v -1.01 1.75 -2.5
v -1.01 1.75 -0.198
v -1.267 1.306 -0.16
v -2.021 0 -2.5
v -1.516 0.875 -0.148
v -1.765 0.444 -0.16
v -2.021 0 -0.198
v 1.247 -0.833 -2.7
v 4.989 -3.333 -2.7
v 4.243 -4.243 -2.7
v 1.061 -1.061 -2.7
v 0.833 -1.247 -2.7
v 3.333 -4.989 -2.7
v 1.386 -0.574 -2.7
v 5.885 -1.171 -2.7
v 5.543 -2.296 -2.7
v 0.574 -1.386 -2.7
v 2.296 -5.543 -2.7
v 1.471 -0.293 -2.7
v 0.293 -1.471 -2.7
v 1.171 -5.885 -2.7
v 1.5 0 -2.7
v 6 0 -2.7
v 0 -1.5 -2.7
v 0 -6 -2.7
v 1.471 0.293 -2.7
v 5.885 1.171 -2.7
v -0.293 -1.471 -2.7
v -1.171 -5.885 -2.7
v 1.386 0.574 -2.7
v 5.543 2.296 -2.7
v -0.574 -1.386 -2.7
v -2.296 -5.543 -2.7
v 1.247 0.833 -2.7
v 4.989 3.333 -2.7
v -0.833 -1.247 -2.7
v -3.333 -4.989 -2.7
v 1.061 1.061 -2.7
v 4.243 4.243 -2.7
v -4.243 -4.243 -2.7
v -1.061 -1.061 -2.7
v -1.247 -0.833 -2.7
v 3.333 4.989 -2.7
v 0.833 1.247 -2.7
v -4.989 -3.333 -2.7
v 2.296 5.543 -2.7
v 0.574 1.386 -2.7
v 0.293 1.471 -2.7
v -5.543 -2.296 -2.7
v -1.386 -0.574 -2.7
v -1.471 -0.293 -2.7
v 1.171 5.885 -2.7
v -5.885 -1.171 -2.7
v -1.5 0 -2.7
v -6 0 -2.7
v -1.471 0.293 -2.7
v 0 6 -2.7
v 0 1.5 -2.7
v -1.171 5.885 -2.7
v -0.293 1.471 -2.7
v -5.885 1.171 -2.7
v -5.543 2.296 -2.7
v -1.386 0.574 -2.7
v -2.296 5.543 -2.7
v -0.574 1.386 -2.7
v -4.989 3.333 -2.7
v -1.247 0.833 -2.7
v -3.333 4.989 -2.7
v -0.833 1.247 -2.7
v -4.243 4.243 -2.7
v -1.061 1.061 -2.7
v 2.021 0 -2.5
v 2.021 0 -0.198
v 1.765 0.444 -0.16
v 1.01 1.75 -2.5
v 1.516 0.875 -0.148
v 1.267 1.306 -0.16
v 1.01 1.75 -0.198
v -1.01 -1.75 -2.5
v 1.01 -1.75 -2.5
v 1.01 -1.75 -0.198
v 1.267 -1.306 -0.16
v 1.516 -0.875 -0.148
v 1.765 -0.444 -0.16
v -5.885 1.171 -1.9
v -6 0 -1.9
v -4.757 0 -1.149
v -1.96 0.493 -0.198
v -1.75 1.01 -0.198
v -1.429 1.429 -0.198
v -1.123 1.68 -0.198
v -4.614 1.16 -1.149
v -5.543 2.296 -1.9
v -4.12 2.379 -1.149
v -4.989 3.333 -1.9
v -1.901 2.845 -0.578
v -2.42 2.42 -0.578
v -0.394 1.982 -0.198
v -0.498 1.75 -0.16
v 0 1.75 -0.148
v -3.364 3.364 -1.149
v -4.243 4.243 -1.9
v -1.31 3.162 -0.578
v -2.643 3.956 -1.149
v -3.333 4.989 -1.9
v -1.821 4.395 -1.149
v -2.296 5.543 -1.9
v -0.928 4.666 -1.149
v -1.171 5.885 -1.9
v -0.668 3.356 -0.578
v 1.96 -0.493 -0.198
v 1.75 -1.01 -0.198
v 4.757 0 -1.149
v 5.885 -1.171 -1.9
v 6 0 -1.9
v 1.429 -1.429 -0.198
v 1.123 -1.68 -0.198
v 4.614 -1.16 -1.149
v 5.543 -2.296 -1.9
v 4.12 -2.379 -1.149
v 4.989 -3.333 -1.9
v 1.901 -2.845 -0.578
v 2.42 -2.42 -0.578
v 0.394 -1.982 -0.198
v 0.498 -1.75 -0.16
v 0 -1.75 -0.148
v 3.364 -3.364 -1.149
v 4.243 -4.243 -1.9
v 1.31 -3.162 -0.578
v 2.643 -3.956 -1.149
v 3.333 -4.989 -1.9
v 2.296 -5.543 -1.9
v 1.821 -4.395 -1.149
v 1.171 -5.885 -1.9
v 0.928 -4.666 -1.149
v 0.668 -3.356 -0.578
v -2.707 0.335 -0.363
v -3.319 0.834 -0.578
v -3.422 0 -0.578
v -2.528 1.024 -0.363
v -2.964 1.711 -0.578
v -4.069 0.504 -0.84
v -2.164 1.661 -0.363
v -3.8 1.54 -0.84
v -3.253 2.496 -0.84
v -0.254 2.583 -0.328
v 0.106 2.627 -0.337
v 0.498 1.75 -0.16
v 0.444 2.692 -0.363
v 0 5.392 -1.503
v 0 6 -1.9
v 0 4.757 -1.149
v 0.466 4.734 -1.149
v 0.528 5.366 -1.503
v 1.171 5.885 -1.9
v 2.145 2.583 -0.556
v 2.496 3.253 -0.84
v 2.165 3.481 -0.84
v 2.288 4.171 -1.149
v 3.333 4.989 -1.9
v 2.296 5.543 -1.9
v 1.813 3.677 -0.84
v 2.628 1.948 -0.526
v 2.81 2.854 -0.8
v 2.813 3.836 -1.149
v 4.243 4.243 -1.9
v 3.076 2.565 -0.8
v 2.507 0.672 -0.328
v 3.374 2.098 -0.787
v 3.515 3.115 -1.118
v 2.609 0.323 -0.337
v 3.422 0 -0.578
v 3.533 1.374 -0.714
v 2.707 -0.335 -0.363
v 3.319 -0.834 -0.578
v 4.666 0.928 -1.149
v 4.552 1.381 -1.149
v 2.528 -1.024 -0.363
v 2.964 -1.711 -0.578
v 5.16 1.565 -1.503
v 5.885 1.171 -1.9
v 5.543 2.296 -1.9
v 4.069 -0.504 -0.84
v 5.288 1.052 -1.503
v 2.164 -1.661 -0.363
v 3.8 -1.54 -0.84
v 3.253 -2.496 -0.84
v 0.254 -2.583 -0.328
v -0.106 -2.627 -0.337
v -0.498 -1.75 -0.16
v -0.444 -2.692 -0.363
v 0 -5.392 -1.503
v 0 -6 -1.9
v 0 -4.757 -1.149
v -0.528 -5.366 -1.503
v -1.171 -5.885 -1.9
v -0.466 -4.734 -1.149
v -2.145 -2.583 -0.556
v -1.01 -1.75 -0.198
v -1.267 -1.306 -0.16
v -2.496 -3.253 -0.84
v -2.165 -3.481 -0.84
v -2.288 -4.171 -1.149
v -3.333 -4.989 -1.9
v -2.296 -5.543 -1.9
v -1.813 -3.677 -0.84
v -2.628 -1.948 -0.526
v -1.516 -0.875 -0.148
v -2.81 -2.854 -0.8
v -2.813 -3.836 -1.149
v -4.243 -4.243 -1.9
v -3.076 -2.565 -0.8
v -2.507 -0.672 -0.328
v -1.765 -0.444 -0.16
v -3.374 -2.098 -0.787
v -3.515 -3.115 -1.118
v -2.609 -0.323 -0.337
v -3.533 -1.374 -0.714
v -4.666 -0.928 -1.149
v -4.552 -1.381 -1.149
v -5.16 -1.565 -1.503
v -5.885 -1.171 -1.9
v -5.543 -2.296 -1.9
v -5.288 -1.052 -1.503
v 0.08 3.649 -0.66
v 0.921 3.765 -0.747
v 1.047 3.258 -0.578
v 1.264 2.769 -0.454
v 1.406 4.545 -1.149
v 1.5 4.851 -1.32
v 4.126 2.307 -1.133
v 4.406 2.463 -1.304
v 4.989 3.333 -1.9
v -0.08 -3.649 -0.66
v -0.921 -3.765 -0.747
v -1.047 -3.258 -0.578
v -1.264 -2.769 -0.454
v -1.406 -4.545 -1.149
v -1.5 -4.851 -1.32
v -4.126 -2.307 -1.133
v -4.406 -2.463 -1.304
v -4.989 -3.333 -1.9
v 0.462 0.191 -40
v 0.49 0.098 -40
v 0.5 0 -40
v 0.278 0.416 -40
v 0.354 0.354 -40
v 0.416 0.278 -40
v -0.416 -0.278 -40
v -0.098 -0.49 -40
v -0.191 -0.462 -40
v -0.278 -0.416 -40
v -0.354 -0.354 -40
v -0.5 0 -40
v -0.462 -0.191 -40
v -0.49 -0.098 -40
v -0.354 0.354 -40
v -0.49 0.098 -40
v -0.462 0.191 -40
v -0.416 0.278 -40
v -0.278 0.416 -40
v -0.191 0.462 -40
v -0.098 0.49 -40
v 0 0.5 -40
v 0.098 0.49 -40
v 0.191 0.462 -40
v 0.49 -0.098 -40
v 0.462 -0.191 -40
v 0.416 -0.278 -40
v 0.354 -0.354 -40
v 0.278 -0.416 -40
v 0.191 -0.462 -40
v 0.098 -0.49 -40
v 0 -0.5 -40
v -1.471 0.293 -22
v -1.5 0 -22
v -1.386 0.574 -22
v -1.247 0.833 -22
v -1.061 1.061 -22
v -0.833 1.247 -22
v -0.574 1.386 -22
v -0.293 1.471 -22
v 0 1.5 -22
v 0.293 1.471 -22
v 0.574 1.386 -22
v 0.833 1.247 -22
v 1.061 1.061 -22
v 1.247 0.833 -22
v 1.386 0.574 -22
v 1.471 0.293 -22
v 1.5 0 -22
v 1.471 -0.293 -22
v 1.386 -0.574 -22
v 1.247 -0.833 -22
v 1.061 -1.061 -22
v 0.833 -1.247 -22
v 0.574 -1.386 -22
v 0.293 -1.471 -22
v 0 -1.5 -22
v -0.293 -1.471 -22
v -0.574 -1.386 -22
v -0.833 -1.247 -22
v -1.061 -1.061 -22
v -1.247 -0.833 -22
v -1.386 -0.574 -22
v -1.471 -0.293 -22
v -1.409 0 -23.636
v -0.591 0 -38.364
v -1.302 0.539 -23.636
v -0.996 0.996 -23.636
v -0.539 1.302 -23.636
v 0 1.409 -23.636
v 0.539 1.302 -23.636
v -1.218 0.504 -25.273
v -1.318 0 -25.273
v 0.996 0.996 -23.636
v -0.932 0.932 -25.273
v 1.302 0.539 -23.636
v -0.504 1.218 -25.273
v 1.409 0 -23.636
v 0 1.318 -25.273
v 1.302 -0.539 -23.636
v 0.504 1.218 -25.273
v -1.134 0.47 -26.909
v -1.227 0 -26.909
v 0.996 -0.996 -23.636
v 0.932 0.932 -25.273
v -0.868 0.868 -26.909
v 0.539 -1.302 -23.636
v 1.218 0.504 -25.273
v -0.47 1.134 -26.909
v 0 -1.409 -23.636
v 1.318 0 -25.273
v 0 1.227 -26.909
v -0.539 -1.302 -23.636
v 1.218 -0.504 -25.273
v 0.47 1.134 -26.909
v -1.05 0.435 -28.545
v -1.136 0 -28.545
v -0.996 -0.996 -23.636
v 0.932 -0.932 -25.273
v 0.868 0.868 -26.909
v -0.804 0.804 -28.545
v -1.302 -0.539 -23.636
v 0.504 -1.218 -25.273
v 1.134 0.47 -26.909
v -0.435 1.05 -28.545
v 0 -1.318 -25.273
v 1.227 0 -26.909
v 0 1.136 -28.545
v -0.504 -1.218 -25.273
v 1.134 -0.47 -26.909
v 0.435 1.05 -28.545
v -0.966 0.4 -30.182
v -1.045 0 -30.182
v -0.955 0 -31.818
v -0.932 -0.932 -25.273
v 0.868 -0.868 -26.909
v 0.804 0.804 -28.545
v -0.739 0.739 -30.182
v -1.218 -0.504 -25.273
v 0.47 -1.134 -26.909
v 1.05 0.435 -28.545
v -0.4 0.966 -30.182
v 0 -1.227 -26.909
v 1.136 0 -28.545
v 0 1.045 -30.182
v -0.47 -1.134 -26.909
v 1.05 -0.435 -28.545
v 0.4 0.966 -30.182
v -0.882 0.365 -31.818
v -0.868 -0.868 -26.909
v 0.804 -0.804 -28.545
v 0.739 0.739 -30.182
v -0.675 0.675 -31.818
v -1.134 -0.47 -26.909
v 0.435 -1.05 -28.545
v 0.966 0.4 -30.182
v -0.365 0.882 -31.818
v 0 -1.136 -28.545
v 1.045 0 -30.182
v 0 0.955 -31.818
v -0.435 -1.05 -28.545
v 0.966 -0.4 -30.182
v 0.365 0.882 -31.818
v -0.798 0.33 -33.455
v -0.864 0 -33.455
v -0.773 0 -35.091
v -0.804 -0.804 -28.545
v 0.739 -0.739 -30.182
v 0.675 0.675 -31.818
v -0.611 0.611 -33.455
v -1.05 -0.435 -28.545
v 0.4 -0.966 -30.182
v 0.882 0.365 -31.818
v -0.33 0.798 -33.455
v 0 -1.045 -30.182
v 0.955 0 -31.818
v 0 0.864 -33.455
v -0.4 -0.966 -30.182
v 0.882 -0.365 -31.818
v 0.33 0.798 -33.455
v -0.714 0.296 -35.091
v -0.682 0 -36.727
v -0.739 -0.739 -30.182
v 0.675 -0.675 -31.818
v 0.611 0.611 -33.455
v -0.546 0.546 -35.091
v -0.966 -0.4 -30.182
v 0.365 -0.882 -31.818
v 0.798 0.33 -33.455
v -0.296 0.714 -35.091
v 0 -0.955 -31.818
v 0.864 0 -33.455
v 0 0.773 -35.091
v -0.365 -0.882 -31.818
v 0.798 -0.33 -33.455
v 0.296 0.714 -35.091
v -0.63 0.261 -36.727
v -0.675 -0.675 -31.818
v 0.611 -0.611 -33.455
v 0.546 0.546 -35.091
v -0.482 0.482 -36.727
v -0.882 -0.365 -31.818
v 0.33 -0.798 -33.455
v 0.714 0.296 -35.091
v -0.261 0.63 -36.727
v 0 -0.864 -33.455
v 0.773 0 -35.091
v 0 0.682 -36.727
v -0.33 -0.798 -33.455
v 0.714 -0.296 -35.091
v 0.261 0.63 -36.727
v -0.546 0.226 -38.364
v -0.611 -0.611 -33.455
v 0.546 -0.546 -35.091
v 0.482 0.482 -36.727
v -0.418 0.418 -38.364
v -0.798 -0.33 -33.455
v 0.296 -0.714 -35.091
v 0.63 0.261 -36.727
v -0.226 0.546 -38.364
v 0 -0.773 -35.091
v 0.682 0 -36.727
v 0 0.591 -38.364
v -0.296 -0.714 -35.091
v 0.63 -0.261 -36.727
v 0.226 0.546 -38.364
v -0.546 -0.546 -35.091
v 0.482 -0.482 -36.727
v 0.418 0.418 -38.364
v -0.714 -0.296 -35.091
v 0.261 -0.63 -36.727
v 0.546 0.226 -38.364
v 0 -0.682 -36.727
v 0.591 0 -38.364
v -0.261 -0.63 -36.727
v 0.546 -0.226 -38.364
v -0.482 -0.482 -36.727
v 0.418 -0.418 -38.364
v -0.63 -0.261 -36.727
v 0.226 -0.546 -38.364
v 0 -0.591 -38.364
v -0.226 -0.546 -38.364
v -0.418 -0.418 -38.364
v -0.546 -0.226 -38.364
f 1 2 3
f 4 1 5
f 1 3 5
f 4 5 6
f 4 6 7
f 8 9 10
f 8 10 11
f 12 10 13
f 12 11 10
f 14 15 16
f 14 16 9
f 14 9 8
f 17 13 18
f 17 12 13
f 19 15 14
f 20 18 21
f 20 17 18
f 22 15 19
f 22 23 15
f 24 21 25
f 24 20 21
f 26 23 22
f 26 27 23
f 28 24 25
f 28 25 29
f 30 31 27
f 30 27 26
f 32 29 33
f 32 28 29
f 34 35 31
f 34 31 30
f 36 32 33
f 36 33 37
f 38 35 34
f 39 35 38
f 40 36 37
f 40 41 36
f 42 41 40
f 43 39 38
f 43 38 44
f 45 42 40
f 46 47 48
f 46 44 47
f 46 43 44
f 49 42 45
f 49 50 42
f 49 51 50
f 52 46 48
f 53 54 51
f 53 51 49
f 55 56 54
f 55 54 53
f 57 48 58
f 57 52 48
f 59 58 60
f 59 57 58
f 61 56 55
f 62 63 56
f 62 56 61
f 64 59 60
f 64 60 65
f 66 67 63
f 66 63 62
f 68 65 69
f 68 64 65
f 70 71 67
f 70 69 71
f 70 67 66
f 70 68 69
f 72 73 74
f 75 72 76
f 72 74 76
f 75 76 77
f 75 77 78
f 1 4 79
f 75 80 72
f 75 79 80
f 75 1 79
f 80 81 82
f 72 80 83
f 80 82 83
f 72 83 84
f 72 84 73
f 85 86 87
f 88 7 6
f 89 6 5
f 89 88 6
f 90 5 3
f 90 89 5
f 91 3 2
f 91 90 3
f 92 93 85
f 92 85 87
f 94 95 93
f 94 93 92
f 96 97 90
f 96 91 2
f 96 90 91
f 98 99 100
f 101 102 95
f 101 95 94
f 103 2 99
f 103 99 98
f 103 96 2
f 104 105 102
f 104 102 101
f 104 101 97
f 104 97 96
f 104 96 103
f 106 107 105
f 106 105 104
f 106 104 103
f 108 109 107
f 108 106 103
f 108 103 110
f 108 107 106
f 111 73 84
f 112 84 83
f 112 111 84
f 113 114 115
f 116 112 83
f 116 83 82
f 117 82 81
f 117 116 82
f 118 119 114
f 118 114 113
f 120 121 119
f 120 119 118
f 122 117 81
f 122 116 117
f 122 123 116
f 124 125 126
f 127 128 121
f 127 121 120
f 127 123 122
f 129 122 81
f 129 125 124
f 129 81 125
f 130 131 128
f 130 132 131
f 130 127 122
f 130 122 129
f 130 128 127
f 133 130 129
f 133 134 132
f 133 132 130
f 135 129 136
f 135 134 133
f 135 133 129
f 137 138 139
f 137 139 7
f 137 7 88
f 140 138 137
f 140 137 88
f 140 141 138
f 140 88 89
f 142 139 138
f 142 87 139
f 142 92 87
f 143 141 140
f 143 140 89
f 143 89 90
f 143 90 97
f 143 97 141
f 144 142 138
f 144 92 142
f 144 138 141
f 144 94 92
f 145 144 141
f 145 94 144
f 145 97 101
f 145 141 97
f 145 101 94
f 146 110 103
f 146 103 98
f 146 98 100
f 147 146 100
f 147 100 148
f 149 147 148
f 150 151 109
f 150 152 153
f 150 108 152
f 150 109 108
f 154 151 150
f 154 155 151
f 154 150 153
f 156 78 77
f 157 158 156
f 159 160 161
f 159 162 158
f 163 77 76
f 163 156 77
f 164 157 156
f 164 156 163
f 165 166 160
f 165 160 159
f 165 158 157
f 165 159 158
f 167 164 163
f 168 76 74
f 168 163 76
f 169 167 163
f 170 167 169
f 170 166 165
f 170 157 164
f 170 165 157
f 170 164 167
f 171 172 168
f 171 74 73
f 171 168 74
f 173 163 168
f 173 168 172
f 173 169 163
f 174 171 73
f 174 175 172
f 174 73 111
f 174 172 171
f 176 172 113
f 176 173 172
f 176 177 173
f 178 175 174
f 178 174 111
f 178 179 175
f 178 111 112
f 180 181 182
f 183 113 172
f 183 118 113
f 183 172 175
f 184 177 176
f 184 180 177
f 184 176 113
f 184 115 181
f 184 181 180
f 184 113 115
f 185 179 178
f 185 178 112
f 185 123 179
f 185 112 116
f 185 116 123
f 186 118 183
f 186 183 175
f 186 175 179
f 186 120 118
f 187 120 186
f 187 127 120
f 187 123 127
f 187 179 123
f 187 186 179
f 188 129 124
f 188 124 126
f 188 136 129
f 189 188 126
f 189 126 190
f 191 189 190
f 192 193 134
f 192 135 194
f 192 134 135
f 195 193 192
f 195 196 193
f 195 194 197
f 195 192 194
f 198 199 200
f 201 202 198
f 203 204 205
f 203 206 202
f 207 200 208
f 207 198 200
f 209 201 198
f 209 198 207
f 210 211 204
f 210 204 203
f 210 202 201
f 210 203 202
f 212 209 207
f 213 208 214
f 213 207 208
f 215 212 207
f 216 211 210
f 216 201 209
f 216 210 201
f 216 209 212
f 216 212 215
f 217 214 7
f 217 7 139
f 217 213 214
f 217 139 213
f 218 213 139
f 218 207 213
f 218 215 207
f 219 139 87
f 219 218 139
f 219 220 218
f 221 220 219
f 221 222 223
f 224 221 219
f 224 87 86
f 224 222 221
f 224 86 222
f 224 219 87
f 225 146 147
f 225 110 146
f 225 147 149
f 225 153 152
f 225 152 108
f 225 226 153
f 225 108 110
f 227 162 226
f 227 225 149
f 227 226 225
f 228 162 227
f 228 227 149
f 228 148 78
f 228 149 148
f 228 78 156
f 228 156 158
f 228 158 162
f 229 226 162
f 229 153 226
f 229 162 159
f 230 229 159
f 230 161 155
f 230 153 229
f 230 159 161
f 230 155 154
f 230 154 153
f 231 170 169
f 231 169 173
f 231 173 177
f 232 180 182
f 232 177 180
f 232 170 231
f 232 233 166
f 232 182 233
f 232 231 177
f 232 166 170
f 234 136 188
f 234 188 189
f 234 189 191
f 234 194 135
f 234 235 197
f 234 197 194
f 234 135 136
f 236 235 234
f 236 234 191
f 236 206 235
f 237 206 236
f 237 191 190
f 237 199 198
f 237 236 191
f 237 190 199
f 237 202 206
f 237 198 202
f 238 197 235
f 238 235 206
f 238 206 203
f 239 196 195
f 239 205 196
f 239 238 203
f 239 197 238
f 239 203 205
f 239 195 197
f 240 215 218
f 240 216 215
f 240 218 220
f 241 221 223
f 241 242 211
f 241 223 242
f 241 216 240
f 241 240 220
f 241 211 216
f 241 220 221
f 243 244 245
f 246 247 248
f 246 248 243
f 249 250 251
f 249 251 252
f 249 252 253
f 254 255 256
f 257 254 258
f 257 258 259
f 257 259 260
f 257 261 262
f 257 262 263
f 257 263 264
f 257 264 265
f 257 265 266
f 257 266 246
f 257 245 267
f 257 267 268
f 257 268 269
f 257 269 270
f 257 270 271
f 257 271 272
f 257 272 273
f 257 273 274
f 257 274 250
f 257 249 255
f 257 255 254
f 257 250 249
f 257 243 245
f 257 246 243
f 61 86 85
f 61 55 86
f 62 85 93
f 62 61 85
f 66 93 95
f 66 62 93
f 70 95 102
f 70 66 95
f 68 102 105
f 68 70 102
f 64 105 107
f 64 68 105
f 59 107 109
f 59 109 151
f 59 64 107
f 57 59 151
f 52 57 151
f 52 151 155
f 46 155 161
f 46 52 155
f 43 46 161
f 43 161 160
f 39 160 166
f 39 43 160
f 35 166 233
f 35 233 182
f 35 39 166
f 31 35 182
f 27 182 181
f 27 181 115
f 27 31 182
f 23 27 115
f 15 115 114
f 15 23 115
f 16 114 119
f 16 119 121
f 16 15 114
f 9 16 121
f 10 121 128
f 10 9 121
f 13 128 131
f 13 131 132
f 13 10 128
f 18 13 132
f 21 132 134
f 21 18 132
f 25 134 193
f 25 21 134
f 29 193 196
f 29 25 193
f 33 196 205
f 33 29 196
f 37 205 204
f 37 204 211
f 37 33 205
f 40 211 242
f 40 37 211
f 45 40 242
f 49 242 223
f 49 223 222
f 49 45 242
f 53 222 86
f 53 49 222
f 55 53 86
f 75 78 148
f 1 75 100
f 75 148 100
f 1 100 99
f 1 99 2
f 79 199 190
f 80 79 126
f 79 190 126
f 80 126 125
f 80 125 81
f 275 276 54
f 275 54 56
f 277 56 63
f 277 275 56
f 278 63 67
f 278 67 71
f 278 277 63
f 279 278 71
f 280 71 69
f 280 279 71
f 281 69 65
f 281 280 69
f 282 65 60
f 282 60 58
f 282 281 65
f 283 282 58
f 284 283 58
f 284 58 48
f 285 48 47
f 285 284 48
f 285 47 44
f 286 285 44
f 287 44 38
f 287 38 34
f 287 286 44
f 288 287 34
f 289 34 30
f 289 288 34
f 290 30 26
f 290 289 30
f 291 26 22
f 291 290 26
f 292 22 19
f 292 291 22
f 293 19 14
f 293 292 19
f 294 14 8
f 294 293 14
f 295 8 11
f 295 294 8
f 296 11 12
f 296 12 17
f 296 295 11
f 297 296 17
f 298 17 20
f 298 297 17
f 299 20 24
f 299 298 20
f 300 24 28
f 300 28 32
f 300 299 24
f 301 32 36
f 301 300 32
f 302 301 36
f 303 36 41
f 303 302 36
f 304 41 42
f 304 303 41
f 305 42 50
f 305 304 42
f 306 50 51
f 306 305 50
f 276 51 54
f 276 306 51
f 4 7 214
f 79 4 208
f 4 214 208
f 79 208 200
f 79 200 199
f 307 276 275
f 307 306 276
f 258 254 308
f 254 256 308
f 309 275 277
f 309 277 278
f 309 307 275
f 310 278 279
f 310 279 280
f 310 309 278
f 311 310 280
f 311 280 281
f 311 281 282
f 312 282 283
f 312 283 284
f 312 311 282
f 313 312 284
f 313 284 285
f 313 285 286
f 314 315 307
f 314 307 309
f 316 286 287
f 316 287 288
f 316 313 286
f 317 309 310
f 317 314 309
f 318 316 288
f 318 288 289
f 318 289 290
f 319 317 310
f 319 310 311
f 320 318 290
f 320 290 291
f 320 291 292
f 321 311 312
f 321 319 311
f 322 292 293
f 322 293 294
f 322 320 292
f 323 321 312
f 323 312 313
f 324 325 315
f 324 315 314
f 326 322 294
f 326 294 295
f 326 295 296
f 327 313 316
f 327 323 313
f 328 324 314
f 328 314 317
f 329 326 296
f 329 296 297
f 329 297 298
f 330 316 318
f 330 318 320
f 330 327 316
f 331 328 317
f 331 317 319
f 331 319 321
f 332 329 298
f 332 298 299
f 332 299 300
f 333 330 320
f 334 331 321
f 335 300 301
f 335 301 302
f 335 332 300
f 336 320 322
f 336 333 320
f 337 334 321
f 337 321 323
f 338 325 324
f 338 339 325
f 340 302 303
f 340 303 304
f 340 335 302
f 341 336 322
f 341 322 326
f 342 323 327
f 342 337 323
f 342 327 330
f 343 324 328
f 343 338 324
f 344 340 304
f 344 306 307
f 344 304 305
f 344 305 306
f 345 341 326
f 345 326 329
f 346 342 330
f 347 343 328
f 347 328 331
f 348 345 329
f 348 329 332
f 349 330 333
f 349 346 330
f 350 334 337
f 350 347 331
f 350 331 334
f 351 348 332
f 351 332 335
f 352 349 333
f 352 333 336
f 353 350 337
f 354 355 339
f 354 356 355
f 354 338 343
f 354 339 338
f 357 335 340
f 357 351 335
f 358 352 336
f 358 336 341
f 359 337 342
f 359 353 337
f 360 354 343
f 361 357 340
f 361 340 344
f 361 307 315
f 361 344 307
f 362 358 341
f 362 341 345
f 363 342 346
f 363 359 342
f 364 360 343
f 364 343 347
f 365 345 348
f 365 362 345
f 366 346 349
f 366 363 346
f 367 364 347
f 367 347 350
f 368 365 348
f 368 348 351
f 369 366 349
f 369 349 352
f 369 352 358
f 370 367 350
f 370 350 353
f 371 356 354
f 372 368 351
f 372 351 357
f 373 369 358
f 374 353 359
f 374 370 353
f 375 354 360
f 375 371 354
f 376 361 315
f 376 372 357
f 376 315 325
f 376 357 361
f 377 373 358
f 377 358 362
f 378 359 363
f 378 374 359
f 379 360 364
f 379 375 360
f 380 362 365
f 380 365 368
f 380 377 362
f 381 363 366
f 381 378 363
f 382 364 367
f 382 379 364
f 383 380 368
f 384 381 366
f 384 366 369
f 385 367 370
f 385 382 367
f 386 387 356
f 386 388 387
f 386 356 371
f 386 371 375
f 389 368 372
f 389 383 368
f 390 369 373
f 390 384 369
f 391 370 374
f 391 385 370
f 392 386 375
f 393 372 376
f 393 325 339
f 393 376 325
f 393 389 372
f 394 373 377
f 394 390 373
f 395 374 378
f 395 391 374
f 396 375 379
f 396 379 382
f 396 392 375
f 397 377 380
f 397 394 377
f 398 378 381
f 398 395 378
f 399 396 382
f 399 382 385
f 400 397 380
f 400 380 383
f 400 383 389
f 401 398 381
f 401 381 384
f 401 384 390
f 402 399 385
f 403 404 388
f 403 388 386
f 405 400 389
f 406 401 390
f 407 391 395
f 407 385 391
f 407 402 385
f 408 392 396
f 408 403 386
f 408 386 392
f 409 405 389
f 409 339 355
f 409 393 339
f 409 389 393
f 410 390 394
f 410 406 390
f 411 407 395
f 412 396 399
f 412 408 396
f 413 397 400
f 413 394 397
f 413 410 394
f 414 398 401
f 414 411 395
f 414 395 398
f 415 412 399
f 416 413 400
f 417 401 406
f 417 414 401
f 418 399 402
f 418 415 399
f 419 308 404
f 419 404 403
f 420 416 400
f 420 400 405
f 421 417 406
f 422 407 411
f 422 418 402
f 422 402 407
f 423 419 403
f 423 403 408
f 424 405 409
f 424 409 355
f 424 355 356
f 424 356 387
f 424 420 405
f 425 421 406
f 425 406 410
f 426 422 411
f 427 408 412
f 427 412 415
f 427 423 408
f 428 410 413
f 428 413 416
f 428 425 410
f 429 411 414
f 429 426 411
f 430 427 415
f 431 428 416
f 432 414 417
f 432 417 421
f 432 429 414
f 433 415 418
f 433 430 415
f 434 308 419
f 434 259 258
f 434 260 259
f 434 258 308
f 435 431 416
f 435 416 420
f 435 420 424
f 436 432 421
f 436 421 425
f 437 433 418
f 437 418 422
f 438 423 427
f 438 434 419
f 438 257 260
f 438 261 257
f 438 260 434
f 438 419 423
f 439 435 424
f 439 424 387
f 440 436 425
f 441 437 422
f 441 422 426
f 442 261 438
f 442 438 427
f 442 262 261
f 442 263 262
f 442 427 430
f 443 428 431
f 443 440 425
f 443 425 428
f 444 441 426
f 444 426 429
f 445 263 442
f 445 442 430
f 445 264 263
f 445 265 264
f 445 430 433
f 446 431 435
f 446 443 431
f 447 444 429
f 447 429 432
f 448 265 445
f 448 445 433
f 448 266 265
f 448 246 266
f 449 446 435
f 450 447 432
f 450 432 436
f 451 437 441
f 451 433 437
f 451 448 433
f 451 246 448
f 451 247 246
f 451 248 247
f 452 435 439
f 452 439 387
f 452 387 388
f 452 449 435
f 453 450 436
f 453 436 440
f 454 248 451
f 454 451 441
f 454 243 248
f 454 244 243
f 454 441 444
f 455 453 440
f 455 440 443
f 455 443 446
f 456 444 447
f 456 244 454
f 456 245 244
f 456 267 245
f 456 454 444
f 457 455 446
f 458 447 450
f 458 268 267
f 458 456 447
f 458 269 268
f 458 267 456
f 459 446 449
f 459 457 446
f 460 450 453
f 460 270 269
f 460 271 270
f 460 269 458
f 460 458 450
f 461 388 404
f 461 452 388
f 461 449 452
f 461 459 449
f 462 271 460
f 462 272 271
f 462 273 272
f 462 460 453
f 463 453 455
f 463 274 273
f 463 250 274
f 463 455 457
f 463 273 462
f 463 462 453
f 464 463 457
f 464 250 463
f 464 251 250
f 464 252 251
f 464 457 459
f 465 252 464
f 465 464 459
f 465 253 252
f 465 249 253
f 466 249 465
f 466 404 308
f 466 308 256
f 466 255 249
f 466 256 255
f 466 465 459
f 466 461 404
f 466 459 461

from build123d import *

# Parameters (mm, degrees)
F2_SIZE2 = 1
F2_SIZE  = 18
F4_DEPTH = 2.5


with BuildPart() as f1:
    # F0 (on Front) → F1 (revolve)
    with BuildSketch(Plane.XZ):
        with BuildLine():
            Line((0, -40), (0, 0))
            ThreePointArc((0, 0), (-3.146824, -0.486346), (-6, -1.9))
            Line((-6, -1.9), (-6, -2.7))
            Line((-6, -2.7), (-1.5, -2.7))
            Line((-1.5, -2.7), (-1.5, -40))
            Line((-1.5, -40), (0, -40))
        make_face()
    revolve(axis=Axis((0, 0, -20), (0, 0, -1)))

    # F2
    f2_edges = [f1.edges().sort_by_distance(p)[0] for p in [
        (1.5, 0, -40),
    ]]
    chamfer(f2_edges, length=F2_SIZE, length2=F2_SIZE2)

    # F3 (on Top) → F4 (cut)
    with BuildSketch(Plane.XY):
        Polygon((1.010363, -1.75), (2.020726, 0), (1.010363, 1.75), (-1.010363, 1.75), (-2.020726, 0), (-1.010363, -1.75), align=None)
    extrude(amount=-F4_DEPTH, mode=Mode.SUBTRACT)


solid = f1.part
